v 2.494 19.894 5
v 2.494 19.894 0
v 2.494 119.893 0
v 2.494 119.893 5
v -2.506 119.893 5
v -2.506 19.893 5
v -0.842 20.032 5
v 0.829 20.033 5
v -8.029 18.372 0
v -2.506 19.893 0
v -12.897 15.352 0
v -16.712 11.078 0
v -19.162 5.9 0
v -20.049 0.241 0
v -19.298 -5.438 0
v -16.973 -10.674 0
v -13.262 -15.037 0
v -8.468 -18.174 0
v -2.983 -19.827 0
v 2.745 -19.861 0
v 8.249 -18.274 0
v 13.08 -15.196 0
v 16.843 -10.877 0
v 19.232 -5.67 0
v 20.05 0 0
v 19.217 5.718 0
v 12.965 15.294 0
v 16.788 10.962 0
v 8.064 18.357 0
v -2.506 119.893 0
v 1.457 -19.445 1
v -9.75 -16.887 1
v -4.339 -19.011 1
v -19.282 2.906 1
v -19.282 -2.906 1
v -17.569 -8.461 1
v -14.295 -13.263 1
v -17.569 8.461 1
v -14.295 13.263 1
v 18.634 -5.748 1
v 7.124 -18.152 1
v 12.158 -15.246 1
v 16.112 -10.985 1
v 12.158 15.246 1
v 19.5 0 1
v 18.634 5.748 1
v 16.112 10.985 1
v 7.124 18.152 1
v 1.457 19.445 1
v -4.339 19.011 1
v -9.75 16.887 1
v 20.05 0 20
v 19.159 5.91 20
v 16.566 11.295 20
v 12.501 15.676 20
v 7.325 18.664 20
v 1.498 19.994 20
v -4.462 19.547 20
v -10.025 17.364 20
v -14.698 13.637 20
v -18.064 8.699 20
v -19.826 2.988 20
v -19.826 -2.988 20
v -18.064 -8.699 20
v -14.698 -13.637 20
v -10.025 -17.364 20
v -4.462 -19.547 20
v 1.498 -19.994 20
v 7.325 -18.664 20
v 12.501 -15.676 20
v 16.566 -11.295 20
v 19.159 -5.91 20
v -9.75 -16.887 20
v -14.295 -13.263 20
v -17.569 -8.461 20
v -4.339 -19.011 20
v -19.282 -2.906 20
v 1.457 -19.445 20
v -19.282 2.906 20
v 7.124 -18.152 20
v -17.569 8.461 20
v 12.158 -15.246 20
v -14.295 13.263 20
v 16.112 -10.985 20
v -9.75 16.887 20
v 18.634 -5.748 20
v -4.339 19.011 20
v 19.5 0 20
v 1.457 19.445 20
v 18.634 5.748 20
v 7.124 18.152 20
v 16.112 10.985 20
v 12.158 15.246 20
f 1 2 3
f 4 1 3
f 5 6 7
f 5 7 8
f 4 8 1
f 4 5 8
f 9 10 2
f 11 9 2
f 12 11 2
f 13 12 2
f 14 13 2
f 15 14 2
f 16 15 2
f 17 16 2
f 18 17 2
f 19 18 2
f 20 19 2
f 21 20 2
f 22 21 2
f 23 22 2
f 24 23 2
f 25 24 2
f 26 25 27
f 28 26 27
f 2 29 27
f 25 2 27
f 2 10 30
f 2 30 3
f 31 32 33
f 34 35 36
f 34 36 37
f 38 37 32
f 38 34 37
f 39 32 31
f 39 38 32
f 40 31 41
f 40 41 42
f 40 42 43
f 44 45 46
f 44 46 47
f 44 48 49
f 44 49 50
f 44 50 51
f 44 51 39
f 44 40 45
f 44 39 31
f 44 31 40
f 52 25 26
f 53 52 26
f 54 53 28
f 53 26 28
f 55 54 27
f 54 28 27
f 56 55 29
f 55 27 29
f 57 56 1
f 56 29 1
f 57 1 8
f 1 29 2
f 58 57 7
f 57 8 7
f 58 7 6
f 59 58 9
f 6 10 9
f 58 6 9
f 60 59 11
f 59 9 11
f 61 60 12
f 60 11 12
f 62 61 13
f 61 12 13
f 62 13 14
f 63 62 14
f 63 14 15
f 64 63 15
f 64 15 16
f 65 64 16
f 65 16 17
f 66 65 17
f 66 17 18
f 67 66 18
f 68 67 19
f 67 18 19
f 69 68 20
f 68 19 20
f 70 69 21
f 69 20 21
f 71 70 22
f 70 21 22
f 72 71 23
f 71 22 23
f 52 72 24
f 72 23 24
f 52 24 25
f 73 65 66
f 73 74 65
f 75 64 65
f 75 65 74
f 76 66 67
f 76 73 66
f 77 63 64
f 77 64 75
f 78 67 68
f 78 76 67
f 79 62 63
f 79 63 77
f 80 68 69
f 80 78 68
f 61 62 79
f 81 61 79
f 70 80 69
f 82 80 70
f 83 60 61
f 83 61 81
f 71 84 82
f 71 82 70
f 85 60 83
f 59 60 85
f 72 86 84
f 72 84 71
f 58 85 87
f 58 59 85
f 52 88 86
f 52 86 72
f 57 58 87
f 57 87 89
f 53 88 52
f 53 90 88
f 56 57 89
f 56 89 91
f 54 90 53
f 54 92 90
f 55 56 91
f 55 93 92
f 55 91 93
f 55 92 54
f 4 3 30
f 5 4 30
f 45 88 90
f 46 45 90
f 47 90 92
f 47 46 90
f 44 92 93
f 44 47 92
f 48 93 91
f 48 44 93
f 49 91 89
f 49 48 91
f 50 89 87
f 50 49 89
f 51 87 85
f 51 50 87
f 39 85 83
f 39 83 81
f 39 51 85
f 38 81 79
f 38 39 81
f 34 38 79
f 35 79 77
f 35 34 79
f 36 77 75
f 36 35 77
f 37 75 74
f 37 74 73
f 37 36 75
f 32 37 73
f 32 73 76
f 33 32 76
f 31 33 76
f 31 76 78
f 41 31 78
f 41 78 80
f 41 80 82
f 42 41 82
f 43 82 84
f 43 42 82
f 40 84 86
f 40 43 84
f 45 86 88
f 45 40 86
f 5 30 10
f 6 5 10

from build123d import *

# Parameters (mm, degrees)
F1_DEPTH = 1
F2_DEPTH = 5
F3_R     = 20.05
F3_R_2   = 19.5
F4_DEPTH = 19


with BuildPart() as f1:
    # F0 (on Top) → F1 (new body)
    with BuildSketch(Plane.XY):
        with BuildLine():
            ThreePointArc((-2.50625, 19.8927426701), (-13.2618284467, -15.0375), (20.05, 0))
            ThreePointArc((20.05, 0), (15.0333327559, 13.2665521614), (2.49375, 19.8943135327))
            ThreePointArc((2.49375, 19.8943135327), (-0.0062991589, 20.0499990105), (-2.50625, 19.8927426701))
        make_face()
    extrude(amount=F1_DEPTH)

    # F0 (on Top) → F2 (join)
    with BuildSketch(Plane.XY):
        with BuildLine():
            ThreePointArc((-2.50625, 19.8927426701), (-0.0062991589, 20.0499990105), (2.49375, 19.8943135327))
            Line((2.49375, 19.8943135327), (2.49375, 119.8927426701))
            Line((2.49375, 119.8927426701), (-2.50625, 119.8927426701))
            Line((-2.50625, 119.8927426701), (-2.50625, 19.8927426701))
        make_face()
    extrude(amount=F2_DEPTH)

    # F3 (on face) → F4 (join)
    with BuildSketch(Plane.XY.offset(1)):
        Circle(F3_R)
        Circle(F3_R_2, mode=Mode.SUBTRACT)
    extrude(amount=F4_DEPTH)


solid = f1.part
